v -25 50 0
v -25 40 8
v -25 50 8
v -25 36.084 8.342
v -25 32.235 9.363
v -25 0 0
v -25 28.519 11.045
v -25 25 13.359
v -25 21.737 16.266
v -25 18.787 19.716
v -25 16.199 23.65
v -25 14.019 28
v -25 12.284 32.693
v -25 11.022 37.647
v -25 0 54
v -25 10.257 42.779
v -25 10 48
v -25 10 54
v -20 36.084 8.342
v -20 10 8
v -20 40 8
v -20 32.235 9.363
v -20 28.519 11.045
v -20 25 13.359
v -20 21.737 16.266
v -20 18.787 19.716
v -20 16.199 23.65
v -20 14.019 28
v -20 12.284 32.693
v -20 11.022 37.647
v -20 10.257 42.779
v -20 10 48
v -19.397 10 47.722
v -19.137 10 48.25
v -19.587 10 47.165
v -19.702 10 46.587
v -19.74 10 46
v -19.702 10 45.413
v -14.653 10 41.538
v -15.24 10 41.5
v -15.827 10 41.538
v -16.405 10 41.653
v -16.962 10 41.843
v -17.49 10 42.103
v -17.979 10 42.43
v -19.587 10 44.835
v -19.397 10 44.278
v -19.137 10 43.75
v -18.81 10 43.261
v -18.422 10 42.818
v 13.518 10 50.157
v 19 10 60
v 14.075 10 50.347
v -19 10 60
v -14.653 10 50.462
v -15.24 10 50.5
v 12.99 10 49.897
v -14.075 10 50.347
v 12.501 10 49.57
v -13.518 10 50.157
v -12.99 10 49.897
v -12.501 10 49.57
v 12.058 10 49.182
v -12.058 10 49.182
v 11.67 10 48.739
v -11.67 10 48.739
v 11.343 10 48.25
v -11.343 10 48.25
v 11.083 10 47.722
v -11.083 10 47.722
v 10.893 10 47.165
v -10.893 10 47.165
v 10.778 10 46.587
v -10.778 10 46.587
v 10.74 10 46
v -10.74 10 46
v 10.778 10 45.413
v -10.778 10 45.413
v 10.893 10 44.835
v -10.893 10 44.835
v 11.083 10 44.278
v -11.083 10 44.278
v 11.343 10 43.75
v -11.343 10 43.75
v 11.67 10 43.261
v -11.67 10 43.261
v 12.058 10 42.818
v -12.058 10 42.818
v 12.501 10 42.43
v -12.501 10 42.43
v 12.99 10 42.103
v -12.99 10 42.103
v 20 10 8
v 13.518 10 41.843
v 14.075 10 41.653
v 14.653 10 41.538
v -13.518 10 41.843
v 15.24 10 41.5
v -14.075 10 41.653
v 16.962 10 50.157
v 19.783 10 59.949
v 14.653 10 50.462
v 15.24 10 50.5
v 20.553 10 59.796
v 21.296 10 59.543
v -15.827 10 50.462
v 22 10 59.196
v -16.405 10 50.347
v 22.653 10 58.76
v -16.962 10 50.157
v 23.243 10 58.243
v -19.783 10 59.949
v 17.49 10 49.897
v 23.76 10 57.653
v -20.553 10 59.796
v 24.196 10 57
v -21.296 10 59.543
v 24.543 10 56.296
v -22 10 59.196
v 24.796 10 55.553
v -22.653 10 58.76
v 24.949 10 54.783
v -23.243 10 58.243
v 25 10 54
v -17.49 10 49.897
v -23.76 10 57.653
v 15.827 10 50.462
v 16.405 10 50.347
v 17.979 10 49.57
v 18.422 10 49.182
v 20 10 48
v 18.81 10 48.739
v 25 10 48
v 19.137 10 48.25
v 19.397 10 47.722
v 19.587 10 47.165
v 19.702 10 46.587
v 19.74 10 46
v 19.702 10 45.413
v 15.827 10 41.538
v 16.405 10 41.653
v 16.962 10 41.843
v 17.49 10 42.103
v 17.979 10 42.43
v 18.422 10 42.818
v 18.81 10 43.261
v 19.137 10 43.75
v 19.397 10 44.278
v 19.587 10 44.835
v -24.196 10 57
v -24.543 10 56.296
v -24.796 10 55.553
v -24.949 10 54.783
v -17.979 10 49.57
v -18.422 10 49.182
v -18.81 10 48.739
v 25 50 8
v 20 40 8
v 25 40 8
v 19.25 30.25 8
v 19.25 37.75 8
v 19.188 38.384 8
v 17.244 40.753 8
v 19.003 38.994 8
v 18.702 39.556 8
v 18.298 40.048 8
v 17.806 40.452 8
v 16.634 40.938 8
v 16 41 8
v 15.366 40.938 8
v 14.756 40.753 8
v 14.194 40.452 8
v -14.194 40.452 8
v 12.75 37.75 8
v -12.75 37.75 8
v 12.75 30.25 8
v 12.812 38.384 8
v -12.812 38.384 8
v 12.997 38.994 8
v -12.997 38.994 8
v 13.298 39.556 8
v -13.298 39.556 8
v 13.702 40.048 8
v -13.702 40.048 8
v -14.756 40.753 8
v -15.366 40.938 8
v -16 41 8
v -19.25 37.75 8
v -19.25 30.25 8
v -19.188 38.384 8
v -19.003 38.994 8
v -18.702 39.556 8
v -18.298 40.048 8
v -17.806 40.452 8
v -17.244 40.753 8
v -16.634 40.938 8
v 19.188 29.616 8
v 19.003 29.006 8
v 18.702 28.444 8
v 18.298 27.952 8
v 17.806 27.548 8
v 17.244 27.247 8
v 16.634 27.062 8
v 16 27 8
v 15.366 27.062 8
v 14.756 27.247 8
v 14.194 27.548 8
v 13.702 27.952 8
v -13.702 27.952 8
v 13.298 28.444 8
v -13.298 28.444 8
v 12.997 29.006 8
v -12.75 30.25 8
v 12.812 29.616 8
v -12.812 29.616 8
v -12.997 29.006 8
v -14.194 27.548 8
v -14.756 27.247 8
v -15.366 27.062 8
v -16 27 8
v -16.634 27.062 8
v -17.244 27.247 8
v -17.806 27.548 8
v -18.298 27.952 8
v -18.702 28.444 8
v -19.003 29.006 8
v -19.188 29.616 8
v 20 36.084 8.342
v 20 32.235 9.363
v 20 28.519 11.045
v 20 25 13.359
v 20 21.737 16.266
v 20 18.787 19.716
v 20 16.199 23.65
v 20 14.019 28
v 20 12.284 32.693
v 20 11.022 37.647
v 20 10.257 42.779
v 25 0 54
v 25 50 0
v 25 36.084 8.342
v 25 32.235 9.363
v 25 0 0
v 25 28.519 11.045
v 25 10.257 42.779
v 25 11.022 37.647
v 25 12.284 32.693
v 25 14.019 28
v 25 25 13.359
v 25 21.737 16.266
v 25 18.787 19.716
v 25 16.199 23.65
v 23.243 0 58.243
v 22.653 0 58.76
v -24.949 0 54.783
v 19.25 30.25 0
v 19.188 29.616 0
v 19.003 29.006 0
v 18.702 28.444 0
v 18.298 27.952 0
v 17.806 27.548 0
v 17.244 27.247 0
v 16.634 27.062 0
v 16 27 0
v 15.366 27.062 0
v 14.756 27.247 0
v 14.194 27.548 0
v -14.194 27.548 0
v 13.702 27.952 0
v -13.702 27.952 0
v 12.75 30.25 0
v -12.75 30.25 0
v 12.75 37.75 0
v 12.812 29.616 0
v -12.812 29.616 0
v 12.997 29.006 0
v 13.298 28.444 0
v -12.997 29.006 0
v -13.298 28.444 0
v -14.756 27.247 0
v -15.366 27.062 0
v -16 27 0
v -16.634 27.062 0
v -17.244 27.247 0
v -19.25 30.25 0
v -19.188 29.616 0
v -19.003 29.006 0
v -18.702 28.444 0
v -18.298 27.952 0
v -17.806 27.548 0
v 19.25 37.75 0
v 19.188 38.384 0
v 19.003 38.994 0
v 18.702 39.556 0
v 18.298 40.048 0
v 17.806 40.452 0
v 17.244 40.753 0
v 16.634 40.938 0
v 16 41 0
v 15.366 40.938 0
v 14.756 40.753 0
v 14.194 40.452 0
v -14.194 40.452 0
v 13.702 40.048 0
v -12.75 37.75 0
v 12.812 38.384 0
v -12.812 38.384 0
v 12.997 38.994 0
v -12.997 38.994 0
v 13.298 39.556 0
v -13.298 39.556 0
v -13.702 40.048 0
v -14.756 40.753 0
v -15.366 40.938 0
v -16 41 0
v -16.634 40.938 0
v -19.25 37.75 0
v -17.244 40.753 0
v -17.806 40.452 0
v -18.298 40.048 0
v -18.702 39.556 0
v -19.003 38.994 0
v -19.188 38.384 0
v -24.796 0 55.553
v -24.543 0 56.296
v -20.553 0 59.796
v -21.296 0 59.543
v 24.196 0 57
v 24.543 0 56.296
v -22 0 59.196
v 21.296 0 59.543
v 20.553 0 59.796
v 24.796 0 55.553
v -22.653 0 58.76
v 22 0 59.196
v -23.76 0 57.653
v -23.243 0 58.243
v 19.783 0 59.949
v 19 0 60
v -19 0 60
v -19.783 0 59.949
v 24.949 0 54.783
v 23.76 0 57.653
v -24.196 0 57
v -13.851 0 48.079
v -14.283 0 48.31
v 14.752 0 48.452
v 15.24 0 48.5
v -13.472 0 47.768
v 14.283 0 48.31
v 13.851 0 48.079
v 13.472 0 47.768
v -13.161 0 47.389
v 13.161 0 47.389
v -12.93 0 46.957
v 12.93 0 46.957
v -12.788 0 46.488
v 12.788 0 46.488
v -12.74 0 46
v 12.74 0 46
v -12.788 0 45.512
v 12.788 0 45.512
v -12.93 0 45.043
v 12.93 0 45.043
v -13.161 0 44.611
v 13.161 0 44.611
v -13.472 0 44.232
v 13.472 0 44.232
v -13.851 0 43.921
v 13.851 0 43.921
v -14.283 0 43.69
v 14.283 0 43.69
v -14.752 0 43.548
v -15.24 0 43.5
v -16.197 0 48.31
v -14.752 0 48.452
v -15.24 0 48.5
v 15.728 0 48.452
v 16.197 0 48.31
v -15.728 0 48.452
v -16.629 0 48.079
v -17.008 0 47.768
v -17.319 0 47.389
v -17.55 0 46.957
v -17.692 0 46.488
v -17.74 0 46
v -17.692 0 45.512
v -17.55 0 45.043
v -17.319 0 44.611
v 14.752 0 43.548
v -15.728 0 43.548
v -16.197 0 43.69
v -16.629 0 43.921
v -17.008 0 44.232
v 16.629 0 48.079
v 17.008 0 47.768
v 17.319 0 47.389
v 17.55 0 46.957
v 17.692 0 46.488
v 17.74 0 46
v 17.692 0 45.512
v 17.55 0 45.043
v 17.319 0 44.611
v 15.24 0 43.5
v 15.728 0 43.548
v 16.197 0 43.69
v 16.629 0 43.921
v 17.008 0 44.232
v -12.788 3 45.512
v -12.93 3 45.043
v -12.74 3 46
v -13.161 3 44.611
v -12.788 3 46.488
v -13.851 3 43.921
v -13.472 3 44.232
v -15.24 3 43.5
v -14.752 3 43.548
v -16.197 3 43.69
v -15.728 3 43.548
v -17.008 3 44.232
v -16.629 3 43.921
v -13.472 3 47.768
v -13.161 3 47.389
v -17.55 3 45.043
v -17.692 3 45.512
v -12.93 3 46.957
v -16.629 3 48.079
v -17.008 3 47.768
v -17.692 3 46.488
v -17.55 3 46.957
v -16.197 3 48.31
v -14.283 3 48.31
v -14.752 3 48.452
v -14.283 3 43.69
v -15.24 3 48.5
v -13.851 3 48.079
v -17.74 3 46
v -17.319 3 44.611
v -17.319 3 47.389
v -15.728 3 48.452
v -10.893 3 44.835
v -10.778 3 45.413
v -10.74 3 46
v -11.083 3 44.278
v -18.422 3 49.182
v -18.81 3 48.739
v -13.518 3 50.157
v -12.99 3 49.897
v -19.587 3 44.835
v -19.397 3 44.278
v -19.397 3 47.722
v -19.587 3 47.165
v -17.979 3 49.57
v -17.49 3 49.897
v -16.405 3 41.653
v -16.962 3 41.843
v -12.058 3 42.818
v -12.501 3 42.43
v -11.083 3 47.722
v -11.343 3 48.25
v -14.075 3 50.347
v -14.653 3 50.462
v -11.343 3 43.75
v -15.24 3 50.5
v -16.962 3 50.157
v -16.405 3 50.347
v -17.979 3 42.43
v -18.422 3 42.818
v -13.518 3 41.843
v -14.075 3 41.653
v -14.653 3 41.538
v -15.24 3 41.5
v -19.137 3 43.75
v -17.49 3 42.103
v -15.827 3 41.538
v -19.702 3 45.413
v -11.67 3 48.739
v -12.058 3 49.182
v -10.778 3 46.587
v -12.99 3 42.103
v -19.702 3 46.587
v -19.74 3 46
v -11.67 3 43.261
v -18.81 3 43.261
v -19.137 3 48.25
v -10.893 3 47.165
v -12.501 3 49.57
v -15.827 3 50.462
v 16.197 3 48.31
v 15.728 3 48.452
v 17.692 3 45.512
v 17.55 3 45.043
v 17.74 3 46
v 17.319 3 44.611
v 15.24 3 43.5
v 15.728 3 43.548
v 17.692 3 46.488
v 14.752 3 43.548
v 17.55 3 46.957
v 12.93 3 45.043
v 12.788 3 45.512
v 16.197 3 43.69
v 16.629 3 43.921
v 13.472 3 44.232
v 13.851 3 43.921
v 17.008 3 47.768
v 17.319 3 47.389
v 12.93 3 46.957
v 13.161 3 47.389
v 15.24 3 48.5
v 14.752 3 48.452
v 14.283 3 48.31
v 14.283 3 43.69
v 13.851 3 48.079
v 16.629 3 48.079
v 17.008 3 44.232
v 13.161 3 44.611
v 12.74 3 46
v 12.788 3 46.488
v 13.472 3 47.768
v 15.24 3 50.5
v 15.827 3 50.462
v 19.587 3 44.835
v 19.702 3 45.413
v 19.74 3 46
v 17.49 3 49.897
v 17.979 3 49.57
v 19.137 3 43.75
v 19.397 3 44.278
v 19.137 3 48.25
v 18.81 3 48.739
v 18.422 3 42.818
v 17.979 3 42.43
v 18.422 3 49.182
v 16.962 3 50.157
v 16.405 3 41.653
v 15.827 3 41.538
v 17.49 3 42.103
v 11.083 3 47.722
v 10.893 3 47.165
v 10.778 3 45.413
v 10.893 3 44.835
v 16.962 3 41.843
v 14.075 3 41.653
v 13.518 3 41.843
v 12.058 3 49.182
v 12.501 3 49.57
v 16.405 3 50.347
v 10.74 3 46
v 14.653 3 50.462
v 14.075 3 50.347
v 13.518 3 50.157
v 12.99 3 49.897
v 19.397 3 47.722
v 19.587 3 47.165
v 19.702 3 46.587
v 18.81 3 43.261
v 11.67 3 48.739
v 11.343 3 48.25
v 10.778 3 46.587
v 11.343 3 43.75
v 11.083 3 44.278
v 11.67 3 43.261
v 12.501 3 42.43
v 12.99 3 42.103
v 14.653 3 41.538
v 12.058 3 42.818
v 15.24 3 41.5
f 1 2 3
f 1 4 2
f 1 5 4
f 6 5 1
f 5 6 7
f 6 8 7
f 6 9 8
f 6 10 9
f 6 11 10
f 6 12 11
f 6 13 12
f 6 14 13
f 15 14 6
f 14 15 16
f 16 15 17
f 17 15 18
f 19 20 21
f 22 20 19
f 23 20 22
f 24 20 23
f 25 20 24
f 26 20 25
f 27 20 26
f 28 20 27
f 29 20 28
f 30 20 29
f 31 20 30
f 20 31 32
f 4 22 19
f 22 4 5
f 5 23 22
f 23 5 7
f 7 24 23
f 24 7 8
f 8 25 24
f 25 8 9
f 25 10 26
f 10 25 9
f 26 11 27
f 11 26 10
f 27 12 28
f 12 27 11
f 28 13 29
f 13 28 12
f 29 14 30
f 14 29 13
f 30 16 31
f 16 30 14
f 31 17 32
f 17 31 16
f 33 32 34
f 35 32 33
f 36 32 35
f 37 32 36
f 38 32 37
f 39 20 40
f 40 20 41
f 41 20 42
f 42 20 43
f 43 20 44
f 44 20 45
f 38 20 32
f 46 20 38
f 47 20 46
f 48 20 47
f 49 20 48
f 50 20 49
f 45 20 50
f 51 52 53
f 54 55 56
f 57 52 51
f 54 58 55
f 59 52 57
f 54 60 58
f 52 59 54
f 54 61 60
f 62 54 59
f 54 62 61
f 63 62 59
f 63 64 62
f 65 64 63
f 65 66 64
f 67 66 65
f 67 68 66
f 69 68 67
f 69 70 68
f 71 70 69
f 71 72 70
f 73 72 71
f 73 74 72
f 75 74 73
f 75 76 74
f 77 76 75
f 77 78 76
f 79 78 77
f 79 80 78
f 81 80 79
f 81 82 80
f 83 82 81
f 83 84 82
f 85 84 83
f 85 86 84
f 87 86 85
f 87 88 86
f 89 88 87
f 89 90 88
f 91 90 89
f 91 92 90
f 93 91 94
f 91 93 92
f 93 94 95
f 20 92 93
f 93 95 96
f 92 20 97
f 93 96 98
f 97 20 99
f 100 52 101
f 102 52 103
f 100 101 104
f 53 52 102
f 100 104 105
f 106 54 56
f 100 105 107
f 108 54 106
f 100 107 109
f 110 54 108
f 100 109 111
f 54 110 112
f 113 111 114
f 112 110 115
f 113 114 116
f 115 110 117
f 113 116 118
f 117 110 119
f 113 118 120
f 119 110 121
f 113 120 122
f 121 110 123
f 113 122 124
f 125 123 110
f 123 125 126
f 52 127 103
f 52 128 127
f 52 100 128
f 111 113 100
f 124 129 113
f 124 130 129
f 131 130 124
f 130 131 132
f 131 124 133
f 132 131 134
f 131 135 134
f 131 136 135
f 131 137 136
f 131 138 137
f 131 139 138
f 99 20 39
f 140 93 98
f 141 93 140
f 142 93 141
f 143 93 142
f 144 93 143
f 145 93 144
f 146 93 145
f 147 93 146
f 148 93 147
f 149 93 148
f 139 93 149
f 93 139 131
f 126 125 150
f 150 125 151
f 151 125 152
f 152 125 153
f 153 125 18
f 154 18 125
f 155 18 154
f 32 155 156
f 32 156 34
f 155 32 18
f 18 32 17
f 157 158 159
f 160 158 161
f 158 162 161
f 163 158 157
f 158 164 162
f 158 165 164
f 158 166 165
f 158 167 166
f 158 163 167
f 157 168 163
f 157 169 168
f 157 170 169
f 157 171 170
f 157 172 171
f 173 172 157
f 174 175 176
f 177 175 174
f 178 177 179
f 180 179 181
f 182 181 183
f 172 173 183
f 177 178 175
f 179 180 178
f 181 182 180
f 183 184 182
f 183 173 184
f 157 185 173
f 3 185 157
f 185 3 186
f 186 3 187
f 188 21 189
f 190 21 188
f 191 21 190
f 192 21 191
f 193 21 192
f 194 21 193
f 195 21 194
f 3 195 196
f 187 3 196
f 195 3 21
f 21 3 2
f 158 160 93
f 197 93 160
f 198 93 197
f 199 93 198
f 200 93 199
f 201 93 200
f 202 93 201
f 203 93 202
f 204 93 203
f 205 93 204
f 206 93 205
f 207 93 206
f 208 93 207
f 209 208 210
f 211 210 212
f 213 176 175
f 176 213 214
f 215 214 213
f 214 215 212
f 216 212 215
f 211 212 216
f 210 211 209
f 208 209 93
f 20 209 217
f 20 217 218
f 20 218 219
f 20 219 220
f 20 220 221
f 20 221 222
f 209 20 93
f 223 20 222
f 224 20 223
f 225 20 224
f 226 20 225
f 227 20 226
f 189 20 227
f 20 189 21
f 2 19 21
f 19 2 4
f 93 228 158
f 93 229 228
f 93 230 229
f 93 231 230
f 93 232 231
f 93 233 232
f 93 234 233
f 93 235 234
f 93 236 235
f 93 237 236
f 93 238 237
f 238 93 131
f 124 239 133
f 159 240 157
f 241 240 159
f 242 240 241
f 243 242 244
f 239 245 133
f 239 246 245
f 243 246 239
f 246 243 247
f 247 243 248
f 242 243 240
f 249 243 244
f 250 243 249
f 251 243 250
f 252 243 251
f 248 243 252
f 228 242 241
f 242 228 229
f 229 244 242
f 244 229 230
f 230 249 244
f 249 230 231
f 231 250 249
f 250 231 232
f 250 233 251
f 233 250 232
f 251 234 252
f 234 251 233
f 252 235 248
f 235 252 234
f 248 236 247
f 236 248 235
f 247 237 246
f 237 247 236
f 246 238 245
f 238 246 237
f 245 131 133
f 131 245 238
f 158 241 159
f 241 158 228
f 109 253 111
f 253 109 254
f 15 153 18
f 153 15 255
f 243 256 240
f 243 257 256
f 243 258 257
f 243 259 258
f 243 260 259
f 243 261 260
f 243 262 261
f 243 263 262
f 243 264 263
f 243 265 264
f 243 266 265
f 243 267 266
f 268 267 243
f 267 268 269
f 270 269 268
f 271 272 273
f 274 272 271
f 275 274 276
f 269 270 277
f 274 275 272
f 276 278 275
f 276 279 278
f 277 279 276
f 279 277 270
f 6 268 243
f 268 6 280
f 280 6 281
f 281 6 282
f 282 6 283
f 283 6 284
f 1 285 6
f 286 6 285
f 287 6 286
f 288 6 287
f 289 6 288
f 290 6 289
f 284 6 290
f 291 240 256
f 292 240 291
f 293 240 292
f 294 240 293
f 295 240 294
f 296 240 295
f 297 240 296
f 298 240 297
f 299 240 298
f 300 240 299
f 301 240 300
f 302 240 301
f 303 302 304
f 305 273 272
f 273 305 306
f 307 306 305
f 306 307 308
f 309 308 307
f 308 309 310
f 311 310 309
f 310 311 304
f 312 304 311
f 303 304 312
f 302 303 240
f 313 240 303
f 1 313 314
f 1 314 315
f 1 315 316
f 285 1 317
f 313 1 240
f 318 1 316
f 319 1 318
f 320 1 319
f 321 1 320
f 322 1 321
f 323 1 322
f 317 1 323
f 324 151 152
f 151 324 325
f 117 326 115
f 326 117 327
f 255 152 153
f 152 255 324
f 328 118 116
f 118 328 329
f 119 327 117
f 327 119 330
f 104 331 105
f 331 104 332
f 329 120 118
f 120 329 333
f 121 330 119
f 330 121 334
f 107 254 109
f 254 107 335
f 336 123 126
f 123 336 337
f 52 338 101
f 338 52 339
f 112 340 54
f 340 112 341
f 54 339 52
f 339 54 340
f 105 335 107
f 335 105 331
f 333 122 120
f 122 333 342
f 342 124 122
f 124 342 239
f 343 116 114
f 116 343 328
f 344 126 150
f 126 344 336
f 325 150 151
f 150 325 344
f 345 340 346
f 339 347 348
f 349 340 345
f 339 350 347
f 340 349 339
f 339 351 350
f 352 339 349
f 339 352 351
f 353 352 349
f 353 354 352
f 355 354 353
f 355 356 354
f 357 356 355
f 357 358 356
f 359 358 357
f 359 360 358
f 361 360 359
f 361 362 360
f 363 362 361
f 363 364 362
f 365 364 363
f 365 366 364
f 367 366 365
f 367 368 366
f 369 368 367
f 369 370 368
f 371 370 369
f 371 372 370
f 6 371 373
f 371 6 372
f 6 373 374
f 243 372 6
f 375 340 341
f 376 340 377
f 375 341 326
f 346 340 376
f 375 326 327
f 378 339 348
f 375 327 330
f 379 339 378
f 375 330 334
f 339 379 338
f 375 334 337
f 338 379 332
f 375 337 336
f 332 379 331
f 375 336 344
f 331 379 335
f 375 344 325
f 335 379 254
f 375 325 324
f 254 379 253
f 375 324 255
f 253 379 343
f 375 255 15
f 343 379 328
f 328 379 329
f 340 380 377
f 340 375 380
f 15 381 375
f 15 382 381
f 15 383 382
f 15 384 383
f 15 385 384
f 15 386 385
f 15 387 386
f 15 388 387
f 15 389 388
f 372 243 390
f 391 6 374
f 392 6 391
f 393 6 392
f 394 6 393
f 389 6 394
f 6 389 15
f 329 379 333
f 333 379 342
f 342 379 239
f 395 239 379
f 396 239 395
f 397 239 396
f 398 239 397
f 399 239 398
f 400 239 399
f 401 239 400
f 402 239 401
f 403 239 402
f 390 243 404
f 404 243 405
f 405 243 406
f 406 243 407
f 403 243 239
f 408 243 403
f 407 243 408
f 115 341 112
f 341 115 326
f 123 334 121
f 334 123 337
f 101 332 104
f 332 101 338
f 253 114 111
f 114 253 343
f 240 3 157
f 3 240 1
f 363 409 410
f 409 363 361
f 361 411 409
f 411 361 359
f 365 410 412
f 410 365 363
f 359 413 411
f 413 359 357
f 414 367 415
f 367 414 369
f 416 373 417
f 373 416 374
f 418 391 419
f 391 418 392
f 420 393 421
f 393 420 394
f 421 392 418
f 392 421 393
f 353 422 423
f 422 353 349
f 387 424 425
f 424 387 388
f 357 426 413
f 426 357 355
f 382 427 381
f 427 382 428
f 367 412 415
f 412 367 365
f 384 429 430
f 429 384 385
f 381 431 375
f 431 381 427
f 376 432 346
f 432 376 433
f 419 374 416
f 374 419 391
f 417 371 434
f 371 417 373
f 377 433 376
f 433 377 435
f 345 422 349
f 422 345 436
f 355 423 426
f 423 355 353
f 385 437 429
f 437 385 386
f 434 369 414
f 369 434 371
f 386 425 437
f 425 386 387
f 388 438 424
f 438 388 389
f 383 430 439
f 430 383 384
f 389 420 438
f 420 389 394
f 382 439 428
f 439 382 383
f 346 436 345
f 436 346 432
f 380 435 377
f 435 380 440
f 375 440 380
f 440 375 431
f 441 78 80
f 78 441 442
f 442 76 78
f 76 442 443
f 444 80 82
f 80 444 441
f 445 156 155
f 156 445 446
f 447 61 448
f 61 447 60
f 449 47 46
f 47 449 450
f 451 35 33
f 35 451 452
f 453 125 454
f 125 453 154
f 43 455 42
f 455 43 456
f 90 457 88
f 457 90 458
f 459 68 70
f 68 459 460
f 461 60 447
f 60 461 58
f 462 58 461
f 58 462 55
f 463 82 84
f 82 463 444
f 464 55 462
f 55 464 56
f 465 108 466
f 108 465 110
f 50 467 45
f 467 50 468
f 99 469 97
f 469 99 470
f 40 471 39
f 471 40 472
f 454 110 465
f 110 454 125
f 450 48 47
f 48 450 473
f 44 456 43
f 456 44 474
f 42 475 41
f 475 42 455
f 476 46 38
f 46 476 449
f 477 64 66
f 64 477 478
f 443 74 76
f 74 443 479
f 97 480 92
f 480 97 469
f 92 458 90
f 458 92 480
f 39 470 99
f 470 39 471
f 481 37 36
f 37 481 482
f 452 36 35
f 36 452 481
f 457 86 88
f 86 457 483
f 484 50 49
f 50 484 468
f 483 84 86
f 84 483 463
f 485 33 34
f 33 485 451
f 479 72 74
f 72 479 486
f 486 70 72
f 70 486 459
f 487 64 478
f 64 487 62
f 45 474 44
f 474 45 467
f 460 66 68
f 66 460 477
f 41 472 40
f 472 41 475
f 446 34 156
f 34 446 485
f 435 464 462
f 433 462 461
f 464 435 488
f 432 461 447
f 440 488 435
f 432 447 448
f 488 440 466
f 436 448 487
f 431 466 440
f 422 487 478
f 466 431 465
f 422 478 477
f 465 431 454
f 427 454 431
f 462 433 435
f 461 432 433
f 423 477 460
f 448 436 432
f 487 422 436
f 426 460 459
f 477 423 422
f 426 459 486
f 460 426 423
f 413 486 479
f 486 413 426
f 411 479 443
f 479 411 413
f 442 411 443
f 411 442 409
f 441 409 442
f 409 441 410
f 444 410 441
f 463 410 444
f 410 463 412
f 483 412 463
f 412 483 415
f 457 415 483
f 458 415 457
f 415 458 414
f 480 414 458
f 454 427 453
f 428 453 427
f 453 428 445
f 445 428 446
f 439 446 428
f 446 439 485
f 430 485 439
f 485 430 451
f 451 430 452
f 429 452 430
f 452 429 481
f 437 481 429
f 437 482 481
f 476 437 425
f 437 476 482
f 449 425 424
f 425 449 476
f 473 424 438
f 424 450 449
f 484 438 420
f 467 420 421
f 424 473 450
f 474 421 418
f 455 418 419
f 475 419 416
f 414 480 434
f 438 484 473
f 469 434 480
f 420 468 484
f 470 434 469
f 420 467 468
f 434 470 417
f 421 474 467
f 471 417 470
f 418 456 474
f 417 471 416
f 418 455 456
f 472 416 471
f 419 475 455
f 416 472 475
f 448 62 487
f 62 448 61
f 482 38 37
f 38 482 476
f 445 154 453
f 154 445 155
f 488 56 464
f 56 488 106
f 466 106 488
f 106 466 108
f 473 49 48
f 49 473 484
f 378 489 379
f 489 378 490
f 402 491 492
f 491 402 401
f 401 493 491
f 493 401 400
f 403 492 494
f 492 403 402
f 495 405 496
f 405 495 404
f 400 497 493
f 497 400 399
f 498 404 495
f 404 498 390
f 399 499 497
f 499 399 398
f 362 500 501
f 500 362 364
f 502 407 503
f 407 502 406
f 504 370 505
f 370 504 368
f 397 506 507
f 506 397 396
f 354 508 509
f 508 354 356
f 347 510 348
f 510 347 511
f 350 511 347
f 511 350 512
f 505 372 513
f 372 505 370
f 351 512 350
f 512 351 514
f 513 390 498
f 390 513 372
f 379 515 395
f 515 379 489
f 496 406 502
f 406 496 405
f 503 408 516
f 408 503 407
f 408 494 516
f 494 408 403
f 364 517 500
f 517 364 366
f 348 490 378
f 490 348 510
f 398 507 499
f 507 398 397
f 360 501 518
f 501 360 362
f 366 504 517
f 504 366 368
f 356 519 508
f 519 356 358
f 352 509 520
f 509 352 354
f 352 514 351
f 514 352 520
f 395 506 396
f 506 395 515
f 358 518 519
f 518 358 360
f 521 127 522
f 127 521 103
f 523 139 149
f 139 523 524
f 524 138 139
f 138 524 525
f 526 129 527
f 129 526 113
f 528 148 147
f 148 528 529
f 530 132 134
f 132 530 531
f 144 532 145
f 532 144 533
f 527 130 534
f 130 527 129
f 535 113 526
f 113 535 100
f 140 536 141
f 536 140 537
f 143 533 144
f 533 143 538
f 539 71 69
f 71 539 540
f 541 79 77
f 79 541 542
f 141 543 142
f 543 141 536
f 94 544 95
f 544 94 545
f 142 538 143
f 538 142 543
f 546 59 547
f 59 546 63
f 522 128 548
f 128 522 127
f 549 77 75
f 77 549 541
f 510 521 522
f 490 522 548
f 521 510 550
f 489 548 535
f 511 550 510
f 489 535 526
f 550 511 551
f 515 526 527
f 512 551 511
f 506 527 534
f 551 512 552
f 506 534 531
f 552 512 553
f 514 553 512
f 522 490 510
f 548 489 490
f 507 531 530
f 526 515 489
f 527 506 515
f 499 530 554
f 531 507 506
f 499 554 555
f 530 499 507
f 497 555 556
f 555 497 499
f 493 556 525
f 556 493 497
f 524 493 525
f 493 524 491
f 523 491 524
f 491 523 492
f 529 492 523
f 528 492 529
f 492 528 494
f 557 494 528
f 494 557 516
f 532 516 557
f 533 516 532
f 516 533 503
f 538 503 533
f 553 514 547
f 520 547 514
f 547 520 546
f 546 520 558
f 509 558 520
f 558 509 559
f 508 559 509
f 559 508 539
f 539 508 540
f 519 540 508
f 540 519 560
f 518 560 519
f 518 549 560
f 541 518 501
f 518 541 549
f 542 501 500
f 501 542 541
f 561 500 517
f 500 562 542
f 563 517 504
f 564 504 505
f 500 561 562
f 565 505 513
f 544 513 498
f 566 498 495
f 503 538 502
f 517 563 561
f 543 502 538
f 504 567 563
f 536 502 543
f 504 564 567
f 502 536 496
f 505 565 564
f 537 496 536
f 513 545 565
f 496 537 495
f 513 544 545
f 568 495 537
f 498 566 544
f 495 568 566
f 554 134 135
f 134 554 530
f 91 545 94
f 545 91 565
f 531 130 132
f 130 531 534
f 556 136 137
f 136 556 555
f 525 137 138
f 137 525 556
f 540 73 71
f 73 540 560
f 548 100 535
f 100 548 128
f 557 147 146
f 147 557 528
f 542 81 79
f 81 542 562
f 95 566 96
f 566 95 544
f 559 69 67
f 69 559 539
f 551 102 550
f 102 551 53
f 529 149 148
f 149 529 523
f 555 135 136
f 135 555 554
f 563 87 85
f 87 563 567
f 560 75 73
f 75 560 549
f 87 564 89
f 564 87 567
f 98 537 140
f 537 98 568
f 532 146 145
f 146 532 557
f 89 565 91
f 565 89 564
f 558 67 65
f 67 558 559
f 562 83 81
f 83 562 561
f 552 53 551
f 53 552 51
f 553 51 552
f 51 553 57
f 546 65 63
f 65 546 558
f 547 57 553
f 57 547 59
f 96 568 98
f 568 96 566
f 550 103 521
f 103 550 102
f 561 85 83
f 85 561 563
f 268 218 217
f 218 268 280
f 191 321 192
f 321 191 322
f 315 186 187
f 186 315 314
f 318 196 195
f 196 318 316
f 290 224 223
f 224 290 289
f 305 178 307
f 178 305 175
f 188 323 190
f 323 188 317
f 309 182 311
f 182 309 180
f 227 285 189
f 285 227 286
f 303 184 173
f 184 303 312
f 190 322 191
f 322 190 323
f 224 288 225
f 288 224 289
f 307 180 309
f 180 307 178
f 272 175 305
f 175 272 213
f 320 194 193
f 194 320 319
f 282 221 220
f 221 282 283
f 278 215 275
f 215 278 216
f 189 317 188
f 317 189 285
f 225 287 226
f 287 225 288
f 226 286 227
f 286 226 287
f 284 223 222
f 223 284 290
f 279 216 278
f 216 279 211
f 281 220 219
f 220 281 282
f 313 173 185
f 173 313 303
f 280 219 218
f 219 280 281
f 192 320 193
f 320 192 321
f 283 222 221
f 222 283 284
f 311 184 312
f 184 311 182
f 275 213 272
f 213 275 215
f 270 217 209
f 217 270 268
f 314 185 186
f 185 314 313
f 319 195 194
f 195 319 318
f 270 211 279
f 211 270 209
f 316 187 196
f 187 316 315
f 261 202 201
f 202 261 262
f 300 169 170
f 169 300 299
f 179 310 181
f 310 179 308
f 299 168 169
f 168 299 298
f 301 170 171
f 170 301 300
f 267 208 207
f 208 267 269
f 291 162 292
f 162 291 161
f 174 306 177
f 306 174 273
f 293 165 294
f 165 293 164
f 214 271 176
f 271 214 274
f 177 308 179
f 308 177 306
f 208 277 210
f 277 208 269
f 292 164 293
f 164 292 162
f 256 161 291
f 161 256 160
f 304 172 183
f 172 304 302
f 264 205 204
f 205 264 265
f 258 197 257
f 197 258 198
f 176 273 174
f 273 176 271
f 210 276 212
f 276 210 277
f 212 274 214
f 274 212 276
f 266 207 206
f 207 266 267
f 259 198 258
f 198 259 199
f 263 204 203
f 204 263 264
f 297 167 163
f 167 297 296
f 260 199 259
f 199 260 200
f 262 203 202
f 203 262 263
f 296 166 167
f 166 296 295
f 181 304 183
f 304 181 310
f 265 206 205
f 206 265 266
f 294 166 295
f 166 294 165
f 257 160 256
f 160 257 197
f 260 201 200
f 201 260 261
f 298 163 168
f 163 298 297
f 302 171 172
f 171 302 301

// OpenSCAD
// =============================================================================
// Parametric FPR Bracket — Aeromotive A1000 Gen II EFI (13138/13139/13140)
// =============================================================================
// The regulator bolts to this plate's FRONT face using its two factory tapped
// holes (10-24, supplied socket head cap screws). The plate's base flange has
// slotted holes — the interface to the future chassis-mount assembly that will
// also carry the flex fuel sensor bracket.
//
// !!! VERIFY WITH CALIPERS BEFORE PRINTING (marked [MEASURE]) !!!
// Web sources give the Aeromotive pattern as 1.200" / 10-24 but no official
// dimension drawing exists — measure the actual regulator.
//
// PRINT MATERIAL: ASA (engine bay). Print plate-face down or on its side —
// see BUILD-NOTES.md.
// =============================================================================

// ---- REGULATOR MOUNT PATTERN ----
reg_hole_spacing   = 30.48;  // [MEASURE] center-to-center of the 2 tapped holes (1.200" = 30.48mm, standard Aeromotive pattern)
reg_screw_clear_d  = 5.0;    // clearance hole for 10-24 screw (major dia 4.83mm)
reg_screw_head_d   = 9.0;    // counterbore dia for 10-24 SHCS head (head ~7.9mm + slop)
reg_grip_t         = 3.0;    // material left under the screw head (mm) — with 1/2" (12.7mm) screws this leaves ~9.7mm of thread engagement in the regulator body
reg_holes_horizontal = true; // true = holes side-by-side (regulator upright, adjuster up)

// ---- REGULATOR KEEP-OUT ENVELOPE (ghost preview only — not printed) ----
// [MEASURE] all of these on the actual unit. Used to visualize clearance.
reg_body_dia       = 57.2;   // main billet body diameter (~2.25")
reg_body_h         = 70;     // main body height (side-port section + cap)
reg_total_h        = 118;    // overall height incl. adjuster screw + jam nut
reg_back_to_axis   = 32;     // [MEASURE] distance from the plate front face to the body centerline — the back of the upper housing (where tapped holes live) to body axis
reg_holes_z        = 48;     // [MEASURE] height of the tapped-hole pair above the body's bottom face
an8_fitting_dia    = 26;     // AN-8 hose end hex/socket OD on the side ports
an8_fitting_len    = 40;     // how far a side fitting + hose tail sticks out per side
return_fitting_dia = 22;     // ORB-06 -> AN-6 fitting on the bottom return port
return_fitting_len = 45;     // downward stick-out incl. hose bend start

// ---- PLATE ----
plate_w            = 50;     // plate width (mm) — narrower than the body so side fittings/wrenches clear
plate_h            = 60;     // plate height (mm)
plate_t            = 10;     // plate thickness (mm)
plate_corner_r     = 6;      // corner rounding on the top two corners
holes_z_from_top   = 14;     // regulator hole pair distance down from plate top edge

// ---- BASE FLANGE (interface to future chassis assembly) ----
flange_depth       = 40;     // how far the foot extends rearward (mm)
flange_t           = 8;      // flange thickness (mm)
flange_slot_w      = 6.5;    // slot width — M6 clearance
flange_slot_len    = 14;     // slot length (adjustability for the assembly plate)
flange_slot_spacing = 32;    // center-to-center across X
flange_slot_y      = 24;     // slot center distance rearward from the plate back face
gusset_base        = 30;     // gusset reach along the flange (mm)
gusset_height      = 40;     // gusset reach up the plate (mm)
gusset_thickness   = 5;      // matches wall convention from battery tray
gusset_shape       = "CURVED";  // "CURVED" | "STRAIGHT"
gusset_curve_segments = 48;

// ---- PREVIEW ----
show_regulator_ghost = true; // ghost keep-out model (preview only; excluded from render/STL via %)

// ---- DERIVED ----
holes_z = plate_h - holes_z_from_top;                 // Z of the hole pair on the plate
hx = reg_hole_spacing / 2;

// =============================================================================
// MAIN ASSEMBLY
// =============================================================================
// Coordinate frame: plate front face (regulator side) at Y=0, plate extends to
// Y=plate_t; flange extends rearward +Y along the bottom. X centered on 0.

bracket();
if (show_regulator_ghost) %regulator_ghost();

module bracket() {
    difference() {
        union() {
            plate_body();
            base_flange();
            flange_gussets();
        }
        regulator_screw_holes();
        flange_slots();
    }
}

// =============================================================================
// MODULES
// =============================================================================

module plate_body() {
    // Vertical plate, top two corners rounded
    translate([0, plate_t, 0])
        rotate([90, 0, 0])
            linear_extrude(plate_t)
                rounded_top_rect_2d(plate_w, plate_h, plate_corner_r);
}

module rounded_top_rect_2d(w, h, r) {
    // centered on X=0, base at y=0, both top corners rounded
    hull() {
        translate([-w/2, 0]) square([w, h - r]);
        translate([-w/2 + r, h - r]) circle(r=r, $fn=48);
        translate([ w/2 - r, h - r]) circle(r=r, $fn=48);
    }
}

module regulator_screw_holes() {
    // Screws insert from the BACK (+Y) through the plate into the regulator's
    // tapped holes. Counterbore from the back leaves reg_grip_t at the front.
    positions = reg_holes_horizontal
        ? [[-hx, holes_z], [hx, holes_z]]
        : [[0, holes_z - hx], [0, holes_z + hx]];
    for (p = positions) {
        // through clearance hole
        translate([p[0], -1, p[1]])
            rotate([-90, 0, 0])
                cylinder(d=reg_screw_clear_d, h=plate_t + 2, $fn=32);
        // counterbore from the back face
        translate([p[0], reg_grip_t, p[1]])
            rotate([-90, 0, 0])
                cylinder(d=reg_screw_head_d, h=plate_t - reg_grip_t + 1, $fn=48);
    }
}

module base_flange() {
    translate([-plate_w/2, plate_t, 0])
        cube([plate_w, flange_depth, flange_t]);
}

module flange_slots() {
    // 2 slotted M6 holes, slot long axis along Y (fore-aft adjustability)
    for (sx = [-flange_slot_spacing/2, flange_slot_spacing/2])
        translate([sx, plate_t + flange_slot_y, -1])
            slot_z(flange_slot_w, flange_slot_len, flange_t + 2);
}

module slot_z(w, len, h) {
    // stadium slot along Y, extruded in Z
    hull() {
        translate([0, -(len - w)/2, 0]) cylinder(d=w, h=h, $fn=32);
        translate([0,  (len - w)/2, 0]) cylinder(d=w, h=h, $fn=32);
    }
}

module flange_gussets() {
    // Curved gussets on top of the flange bracing the plate's back face, one per
    // side edge. Corner at (y=plate_t, z=flange_t); base runs rearward (+Y) along
    // the flange, height runs up (+Z) the plate.
    // rotate([90,0,90]) maps polygon +X -> world +Y, +Y -> world +Z, extrude -> +X.
    for (sx = [-plate_w/2, plate_w/2 - gusset_thickness])
        translate([sx, plate_t, flange_t])
            rotate([90, 0, 90])
                linear_extrude(gusset_thickness)
                    gusset_2d_shape(gusset_base, gusset_height);
}

module gusset_2d_shape(base, height) {
    // same helper as battery tray: concave quarter-ellipse hypotenuse
    if (gusset_shape == "STRAIGHT") {
        polygon([[0,0], [base, 0], [0, height]]);
    } else {
        difference() {
            polygon([[0,0], [base, 0], [base, height], [0, height]]);
            translate([base, height])
                scale([abs(base), height])
                    circle(r=1, $fn=gusset_curve_segments);
        }
    }
}

// =============================================================================
// REGULATOR GHOST (keep-out preview)
// =============================================================================
module regulator_ghost() {
    // Body axis sits reg_back_to_axis in FRONT of the plate face (-Y direction),
    // positioned so the tapped-hole pair lands on the plate's hole positions.
    body_bottom_z = holes_z - reg_holes_z;
    translate([0, -reg_back_to_axis, 0]) {
        // main body
        translate([0, 0, body_bottom_z])
            cylinder(d=reg_body_dia, h=reg_body_h, $fn=64);
        // upper cap + adjuster, tapering envelope
        translate([0, 0, body_bottom_z + reg_body_h])
            cylinder(d1=reg_body_dia, d2=14, h=reg_total_h - reg_body_h, $fn=64);
        // AN-8 side fittings (both side ports, along X)
        for (sx = [-1, 1])
            translate([sx * reg_body_dia/2, 0, body_bottom_z + reg_body_h * 0.35])
                rotate([0, sx * 90, 0])
                    cylinder(d=an8_fitting_dia, h=an8_fitting_len, $fn=32);
        // bottom return fitting (ORB-06)
        translate([0, 0, body_bottom_z - return_fitting_len])
            cylinder(d=return_fitting_dia, h=return_fitting_len + 1, $fn=32);
        // gauge port stub (front, -Y)
        translate([0, -reg_body_dia/2 - 15, body_bottom_z + reg_body_h * 0.35])
            rotate([-90, 0, 0])
                cylinder(d=16, h=16, $fn=32);
    }
}
